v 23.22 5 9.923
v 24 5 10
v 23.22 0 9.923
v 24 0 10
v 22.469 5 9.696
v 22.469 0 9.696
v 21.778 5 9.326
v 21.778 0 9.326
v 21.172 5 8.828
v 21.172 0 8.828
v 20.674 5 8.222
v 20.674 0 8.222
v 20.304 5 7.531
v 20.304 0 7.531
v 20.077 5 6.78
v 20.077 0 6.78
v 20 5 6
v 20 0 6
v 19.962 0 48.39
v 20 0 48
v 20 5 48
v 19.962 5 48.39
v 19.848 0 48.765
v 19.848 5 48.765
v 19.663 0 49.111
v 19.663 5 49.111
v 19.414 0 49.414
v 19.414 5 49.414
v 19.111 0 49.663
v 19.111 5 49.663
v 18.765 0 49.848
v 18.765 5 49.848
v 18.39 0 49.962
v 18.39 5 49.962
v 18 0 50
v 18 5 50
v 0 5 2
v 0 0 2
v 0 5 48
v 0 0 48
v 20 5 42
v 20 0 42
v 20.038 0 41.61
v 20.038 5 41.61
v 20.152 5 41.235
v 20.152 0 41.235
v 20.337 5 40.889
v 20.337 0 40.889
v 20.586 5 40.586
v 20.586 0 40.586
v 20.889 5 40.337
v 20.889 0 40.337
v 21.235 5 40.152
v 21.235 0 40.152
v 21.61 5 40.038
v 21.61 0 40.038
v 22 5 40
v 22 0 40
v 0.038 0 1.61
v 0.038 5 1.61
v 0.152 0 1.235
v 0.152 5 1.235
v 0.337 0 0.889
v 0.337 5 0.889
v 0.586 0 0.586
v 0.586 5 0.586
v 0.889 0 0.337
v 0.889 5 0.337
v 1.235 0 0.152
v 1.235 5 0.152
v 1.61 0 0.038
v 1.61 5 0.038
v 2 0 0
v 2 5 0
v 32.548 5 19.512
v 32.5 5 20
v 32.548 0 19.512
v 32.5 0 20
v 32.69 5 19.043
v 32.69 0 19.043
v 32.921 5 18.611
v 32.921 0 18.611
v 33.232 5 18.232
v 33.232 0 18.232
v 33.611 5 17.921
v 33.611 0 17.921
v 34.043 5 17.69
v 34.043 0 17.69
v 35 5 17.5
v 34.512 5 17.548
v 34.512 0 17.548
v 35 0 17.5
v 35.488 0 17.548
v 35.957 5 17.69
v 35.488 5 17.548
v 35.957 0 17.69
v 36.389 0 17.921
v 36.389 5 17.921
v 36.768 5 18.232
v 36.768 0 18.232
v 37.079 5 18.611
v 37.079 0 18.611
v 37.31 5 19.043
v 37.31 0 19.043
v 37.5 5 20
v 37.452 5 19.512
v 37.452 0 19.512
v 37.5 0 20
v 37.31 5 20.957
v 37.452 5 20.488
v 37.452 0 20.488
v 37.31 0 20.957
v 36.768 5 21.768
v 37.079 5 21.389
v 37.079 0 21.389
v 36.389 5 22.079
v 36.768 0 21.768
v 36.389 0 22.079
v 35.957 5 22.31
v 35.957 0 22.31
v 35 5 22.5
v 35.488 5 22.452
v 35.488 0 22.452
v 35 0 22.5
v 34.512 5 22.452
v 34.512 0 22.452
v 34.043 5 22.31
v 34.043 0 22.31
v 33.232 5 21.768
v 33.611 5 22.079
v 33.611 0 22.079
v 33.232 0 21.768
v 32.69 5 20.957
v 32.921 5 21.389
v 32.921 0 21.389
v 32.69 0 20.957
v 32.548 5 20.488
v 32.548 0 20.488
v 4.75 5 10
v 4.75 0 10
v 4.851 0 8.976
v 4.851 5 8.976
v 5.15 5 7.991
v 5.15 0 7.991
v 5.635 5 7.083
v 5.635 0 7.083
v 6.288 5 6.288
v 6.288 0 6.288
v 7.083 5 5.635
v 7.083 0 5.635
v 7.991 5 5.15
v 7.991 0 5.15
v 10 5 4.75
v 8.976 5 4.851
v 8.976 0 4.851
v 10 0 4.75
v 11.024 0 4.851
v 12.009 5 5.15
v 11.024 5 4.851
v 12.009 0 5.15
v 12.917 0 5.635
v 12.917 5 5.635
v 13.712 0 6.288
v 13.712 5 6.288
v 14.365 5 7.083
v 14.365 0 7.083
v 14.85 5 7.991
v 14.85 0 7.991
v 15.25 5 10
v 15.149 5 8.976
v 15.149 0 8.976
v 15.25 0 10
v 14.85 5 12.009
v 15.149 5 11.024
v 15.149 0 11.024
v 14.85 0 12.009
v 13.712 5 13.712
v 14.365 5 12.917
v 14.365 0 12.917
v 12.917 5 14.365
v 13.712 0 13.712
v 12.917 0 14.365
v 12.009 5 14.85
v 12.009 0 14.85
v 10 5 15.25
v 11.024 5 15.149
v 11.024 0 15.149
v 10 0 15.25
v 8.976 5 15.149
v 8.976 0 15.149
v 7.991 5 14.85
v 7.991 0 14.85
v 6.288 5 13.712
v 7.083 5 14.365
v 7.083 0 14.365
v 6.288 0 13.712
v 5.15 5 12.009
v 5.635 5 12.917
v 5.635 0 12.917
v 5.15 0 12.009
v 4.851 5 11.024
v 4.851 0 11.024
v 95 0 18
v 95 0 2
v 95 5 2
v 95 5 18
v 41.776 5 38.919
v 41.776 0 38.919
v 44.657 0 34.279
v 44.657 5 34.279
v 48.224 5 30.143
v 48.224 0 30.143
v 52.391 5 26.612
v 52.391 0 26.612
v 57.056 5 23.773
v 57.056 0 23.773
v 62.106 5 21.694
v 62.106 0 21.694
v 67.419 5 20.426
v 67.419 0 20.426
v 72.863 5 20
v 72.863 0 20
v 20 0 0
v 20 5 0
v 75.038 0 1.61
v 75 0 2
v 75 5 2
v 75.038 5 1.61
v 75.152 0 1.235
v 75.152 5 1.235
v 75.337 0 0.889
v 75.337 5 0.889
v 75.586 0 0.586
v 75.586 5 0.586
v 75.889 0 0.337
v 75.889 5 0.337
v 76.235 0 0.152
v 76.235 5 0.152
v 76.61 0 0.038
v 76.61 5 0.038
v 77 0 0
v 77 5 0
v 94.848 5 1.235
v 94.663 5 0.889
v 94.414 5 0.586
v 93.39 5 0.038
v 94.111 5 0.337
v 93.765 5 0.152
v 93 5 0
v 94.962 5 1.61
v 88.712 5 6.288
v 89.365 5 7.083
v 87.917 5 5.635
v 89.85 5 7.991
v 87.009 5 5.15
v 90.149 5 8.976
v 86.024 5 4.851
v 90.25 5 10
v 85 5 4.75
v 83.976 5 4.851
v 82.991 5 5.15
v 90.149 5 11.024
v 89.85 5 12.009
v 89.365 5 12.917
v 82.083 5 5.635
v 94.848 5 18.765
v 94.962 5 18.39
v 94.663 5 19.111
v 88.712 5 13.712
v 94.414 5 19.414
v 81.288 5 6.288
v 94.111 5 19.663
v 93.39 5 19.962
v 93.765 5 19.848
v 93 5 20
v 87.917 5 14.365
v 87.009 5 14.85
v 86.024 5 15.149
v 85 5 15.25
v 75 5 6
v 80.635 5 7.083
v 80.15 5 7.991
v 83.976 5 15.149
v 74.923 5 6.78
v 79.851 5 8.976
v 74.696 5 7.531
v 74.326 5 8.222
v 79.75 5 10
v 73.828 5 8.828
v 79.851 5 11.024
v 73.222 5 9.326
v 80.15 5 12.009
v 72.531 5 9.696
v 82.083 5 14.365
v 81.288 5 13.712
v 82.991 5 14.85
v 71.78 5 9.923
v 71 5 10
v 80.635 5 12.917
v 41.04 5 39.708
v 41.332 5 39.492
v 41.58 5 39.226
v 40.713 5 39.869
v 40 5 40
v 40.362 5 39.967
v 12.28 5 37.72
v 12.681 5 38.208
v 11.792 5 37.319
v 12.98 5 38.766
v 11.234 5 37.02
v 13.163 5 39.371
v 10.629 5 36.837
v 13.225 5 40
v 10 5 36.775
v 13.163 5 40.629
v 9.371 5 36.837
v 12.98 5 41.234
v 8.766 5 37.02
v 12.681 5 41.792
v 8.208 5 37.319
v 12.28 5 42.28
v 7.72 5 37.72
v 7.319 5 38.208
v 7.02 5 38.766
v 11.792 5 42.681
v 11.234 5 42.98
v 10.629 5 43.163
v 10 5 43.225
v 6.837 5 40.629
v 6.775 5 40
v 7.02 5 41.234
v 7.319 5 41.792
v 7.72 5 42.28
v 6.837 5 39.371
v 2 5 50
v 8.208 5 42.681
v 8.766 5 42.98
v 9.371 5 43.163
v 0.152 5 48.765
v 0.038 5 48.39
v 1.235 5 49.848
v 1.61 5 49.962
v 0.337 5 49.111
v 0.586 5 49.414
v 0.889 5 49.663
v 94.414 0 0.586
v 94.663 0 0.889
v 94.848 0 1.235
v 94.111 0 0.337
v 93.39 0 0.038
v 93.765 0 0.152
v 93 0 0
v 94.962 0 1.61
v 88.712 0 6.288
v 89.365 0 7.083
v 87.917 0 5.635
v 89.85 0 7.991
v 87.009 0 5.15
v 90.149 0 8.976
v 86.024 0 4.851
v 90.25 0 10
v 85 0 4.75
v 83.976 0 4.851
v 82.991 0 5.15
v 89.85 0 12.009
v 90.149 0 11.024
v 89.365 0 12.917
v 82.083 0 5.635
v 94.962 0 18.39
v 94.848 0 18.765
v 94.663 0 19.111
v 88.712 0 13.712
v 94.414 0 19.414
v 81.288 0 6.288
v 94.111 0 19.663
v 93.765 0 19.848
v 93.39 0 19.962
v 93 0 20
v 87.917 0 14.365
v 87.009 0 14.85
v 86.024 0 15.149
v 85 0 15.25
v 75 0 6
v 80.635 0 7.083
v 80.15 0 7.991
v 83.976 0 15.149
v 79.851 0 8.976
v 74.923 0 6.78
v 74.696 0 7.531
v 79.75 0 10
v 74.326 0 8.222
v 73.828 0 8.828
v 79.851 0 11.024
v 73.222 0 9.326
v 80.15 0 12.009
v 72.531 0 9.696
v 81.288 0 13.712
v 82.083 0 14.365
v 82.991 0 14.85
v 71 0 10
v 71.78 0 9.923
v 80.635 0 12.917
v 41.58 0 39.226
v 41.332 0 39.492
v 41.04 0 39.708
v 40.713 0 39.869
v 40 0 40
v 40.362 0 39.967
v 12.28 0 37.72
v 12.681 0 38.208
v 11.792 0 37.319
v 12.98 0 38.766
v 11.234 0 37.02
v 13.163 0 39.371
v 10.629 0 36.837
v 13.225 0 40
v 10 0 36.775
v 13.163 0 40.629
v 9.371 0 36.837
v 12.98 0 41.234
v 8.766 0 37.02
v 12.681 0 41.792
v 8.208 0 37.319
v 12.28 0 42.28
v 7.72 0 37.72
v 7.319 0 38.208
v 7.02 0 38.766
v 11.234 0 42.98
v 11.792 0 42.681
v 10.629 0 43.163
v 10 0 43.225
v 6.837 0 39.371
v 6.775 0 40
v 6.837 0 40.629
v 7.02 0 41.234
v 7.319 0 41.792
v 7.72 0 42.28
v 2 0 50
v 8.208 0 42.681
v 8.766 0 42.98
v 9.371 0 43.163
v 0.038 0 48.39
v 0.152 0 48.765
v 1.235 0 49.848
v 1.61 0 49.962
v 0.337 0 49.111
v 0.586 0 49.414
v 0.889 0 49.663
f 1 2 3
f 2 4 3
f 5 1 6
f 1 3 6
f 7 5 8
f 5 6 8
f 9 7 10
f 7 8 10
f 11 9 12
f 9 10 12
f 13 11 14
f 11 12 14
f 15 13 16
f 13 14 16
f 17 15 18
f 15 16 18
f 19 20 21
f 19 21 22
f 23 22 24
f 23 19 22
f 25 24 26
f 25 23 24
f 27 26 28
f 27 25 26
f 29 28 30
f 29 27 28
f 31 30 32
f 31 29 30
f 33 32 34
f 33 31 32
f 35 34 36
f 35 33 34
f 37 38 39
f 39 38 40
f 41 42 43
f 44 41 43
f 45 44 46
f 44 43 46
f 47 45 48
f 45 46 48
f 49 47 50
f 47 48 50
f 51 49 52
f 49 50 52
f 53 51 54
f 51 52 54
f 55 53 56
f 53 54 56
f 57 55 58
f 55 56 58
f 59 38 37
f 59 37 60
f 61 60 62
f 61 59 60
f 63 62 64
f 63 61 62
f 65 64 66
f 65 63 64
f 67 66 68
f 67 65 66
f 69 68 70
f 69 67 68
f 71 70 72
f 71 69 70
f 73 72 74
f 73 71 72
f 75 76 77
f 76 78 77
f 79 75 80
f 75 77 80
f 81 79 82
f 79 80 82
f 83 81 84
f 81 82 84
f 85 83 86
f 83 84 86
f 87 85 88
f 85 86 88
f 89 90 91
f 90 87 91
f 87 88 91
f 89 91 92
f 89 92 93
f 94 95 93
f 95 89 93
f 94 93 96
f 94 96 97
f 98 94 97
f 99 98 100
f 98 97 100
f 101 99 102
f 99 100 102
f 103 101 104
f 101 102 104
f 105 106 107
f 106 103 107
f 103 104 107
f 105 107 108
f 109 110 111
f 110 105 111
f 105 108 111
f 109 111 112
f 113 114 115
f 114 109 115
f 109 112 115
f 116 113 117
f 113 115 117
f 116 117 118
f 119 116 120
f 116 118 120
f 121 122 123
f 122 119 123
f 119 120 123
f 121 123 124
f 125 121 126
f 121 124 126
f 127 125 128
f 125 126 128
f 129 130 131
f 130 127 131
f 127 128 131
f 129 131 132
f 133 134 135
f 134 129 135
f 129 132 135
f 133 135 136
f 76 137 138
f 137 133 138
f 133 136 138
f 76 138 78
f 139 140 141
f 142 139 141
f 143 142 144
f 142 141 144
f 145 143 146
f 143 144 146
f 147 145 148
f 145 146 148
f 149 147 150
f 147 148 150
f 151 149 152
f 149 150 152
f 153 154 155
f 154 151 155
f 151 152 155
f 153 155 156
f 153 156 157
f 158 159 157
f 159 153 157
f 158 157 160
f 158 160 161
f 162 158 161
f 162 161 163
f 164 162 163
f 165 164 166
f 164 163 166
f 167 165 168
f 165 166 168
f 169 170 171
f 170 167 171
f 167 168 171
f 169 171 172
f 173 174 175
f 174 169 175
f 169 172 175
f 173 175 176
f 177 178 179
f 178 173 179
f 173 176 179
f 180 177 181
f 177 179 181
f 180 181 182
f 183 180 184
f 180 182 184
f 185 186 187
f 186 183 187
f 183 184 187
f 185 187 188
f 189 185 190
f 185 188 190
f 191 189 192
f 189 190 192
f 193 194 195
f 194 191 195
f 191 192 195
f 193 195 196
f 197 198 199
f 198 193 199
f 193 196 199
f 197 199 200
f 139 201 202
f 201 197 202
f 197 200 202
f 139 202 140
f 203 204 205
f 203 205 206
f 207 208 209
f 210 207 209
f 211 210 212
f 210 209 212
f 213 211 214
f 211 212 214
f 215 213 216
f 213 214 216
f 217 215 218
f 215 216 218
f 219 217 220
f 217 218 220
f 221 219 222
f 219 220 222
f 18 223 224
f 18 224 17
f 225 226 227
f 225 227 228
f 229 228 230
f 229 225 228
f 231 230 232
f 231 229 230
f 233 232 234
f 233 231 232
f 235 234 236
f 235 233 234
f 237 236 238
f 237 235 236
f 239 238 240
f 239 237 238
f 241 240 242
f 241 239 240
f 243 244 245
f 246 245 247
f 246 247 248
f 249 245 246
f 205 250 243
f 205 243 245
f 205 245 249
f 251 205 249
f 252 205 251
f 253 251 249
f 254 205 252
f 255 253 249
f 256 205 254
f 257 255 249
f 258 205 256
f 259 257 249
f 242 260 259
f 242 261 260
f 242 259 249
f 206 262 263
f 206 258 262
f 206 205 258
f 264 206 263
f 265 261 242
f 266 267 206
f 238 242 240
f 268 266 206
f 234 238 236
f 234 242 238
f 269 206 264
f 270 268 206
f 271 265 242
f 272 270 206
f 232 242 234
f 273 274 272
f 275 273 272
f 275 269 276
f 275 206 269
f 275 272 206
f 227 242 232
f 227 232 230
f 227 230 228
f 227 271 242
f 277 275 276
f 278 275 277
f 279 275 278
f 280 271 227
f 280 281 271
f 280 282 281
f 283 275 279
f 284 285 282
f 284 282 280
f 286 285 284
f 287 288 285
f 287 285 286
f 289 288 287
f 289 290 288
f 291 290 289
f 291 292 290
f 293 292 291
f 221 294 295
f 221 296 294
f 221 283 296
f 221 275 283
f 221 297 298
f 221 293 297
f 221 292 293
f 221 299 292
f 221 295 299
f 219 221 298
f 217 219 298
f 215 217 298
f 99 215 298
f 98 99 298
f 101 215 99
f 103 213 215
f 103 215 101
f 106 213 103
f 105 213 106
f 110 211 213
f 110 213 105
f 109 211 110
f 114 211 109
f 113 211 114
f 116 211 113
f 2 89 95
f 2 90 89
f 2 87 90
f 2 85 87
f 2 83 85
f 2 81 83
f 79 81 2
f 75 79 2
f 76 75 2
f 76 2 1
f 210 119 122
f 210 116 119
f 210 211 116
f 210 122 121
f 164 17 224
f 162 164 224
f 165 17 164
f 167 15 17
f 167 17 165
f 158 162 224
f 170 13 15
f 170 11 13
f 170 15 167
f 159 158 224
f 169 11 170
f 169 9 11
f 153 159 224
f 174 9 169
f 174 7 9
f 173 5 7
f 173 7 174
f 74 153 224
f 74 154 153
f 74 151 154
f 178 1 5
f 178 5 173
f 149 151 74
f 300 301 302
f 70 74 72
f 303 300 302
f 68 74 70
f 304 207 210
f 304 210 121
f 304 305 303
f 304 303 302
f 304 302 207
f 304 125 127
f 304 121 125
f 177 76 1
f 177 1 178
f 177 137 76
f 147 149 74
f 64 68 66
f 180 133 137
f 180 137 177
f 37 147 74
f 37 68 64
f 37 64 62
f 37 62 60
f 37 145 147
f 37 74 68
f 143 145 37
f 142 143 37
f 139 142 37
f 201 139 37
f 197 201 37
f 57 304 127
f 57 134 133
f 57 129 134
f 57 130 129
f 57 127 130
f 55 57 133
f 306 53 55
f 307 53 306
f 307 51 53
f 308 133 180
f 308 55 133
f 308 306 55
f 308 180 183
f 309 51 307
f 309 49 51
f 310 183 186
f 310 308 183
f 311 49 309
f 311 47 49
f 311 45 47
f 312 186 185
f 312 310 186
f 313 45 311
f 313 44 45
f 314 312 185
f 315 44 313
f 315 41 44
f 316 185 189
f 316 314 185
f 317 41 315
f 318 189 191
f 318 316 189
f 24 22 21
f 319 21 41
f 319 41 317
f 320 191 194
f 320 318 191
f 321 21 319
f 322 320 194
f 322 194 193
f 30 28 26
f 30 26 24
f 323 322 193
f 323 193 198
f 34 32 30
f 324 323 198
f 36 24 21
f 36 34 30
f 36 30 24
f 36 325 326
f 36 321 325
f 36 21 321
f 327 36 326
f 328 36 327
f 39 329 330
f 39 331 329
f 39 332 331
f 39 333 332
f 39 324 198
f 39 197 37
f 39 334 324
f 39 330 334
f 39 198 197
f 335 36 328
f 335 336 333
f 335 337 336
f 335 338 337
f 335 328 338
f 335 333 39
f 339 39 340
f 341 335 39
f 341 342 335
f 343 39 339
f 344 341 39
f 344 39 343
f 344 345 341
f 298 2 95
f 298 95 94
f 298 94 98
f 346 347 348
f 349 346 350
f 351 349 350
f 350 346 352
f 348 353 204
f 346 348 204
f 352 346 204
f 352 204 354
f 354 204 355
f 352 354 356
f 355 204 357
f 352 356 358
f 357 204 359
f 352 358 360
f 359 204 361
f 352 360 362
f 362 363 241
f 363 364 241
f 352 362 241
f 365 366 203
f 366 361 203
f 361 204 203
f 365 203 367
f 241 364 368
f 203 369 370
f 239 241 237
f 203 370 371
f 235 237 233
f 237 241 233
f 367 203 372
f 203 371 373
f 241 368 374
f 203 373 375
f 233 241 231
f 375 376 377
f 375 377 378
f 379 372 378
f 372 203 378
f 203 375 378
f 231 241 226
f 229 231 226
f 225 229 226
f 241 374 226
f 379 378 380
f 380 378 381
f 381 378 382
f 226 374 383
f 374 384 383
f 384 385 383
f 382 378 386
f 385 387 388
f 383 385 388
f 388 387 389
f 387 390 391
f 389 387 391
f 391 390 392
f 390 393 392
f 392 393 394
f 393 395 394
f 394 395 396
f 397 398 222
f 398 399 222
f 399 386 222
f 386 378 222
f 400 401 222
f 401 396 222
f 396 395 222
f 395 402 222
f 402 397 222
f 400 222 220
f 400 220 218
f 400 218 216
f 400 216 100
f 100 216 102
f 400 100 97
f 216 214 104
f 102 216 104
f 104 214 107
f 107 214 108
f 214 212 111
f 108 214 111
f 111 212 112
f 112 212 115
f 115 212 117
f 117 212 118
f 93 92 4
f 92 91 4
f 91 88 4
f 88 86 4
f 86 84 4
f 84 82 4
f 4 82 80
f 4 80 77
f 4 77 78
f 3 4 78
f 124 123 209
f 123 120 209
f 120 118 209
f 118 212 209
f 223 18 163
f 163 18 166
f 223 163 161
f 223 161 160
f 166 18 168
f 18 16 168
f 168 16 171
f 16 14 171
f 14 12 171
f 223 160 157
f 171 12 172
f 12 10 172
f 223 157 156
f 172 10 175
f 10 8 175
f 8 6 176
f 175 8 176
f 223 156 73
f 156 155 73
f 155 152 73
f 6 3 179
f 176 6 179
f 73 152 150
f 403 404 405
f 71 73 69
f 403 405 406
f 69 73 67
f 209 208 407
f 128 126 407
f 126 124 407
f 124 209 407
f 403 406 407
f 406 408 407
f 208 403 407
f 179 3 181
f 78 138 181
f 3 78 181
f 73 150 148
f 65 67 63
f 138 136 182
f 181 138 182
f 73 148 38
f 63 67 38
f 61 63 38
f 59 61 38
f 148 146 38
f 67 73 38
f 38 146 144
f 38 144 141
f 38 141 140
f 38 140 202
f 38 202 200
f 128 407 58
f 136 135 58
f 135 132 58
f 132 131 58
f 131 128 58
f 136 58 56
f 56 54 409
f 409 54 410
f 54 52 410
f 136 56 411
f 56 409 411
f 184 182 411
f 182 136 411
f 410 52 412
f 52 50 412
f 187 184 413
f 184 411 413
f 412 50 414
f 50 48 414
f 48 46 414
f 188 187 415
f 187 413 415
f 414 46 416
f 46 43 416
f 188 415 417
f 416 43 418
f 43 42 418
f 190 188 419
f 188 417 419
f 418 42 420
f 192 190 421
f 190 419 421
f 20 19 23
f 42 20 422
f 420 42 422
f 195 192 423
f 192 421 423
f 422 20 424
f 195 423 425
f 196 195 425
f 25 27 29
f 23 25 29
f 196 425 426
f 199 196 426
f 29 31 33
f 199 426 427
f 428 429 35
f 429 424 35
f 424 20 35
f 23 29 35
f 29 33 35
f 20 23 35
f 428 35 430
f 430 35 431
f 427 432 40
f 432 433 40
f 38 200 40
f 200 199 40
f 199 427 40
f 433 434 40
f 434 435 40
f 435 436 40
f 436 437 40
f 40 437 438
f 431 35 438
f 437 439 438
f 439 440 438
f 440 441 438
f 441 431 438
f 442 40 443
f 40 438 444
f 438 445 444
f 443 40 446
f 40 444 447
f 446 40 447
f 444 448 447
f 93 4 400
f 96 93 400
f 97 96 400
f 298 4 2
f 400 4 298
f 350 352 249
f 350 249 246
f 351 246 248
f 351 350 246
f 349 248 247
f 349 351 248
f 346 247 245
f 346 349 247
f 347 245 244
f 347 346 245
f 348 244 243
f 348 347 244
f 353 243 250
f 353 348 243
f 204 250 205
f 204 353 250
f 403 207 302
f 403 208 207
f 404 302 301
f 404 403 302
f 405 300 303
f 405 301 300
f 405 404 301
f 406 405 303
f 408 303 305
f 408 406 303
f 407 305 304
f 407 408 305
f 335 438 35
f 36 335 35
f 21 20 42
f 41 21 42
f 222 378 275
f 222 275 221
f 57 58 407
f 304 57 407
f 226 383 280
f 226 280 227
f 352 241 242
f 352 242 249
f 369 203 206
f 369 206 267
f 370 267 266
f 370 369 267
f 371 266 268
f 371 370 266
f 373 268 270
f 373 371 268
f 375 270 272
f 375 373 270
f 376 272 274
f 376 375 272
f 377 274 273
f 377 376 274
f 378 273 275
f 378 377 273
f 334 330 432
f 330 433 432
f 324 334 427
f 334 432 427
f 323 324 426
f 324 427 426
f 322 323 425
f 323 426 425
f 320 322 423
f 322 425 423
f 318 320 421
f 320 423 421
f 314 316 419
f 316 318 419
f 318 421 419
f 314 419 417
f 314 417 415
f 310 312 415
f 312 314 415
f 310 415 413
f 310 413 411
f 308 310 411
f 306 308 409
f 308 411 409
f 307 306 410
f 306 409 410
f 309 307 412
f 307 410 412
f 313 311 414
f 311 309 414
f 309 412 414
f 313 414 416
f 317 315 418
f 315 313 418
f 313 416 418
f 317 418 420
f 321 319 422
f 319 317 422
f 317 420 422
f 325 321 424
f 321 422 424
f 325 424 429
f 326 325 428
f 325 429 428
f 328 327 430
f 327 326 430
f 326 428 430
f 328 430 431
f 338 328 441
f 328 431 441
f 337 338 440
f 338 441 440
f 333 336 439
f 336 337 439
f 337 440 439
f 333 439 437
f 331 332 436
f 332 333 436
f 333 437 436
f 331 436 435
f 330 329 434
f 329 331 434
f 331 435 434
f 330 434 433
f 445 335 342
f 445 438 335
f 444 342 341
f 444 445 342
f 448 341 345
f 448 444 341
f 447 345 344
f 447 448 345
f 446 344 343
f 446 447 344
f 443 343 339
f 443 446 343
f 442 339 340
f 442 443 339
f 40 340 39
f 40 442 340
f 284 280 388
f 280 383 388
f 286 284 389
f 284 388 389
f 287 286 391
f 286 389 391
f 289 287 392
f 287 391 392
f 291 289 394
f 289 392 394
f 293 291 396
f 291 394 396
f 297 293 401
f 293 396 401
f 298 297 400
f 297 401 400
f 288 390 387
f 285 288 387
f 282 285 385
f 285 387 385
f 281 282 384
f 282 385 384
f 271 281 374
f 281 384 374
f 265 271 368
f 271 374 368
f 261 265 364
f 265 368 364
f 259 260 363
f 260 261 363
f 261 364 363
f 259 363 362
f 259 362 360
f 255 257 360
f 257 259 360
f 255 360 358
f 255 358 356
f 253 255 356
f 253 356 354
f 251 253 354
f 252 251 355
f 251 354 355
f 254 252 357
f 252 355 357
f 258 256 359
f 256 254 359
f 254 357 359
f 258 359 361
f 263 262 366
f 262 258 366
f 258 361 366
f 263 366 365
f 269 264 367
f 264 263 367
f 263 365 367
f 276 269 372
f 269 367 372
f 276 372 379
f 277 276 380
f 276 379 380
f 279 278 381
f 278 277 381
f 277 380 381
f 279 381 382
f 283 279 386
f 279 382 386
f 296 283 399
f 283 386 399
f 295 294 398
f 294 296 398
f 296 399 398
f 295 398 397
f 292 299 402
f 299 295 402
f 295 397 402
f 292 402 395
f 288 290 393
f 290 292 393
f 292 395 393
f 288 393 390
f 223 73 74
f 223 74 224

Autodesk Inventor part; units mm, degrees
ref_plane "YZ Plane" through (0, 0, 0) normal (1, 0, 0) x (0, 1, 0)
ref_plane "XZ Plane" through (0, 0, 0) normal (0, 1, 0) x (-1, 0, 0)
ref_plane "XY Plane" through (0, 0, 0) normal (0, 0, 1) x (1, 0, 0)
sketch "Sketch1" plane through (0, 0, 0) normal (0, 1, 0) x (-1, 0, 0)
  line L0 (0, 2) -> (0, 48)
  line L1 (-2, 50) -> (-18, 50)
  line L2 (-20, 48) -> (-20, 42)
  line L3 (-22, 40) -> (-40, 40)
  line L4 (-2, 0) -> (-20, 0)
  line L5 (-20, 0) -> (-20, 6)
  line L6 (-24, 10) -> (-71, 10)
  line L7 (-75, 6) -> (-75, 2)
  line L8 (-77, 0) -> (-93, 0)
  line L9 (-95, 2) -> (-95, 18)
  arc A0 (-72.8634, 20) -> (-41.7764, 38.9189) centre (-72.8634, 55) ccw
  arc A1 (-40, 40) -> (-41.7764, 38.9189) centre (-40, 38) ccw
  line L10 (-93, 20) -> (-72.8634, 20)
  arc A2 (0, 48) -> (-2, 50) centre (-2, 48) ccw
  arc A3 (-2, 0) -> (0, 2) centre (-2, 2) ccw
  arc A4 (-18, 50) -> (-20, 48) centre (-18, 48) ccw
  arc A5 (-22, 40) -> (-20, 42) centre (-22, 42) ccw
  arc A6 (-77, 0) -> (-75, 2) centre (-77, 2) ccw
  arc A7 (-95, 2) -> (-93, 0) centre (-93, 2) ccw
  arc A8 (-93, 20) -> (-95, 18) centre (-93, 18) ccw
  arc A9 (-20, 6) -> (-24, 10) centre (-24, 6) ccw
  arc A10 (-71, 10) -> (-75, 6) centre (-71, 6) ccw
  circle A11 centre (-10, 40) radius 3.225
  circle A12 centre (-10, 10) radius 5.25
  circle A13 centre (-35, 20) radius 2.5
  circle A14 centre (-85, 10) radius 5.25
  point P0 (0, 0)
  point P1 (0, 50)
  point P2 (-20, 50)
  point P3 (-20, 40)
  point P4 (-20, 10)
  point P5 (-75, 10)
  point P6 (-75, 0)
  point P7 (-95, 0)
  point P8 (-95, 20)
  dimension "d0" = 50
  dimension "d1" = 20
  dimension "d2" = 10
  dimension "d3" = 20
  dimension "d4" = 20
  dimension "d5" = 10
  dimension "d6" = 55
  dimension "d7" = 20
  dimension "d8" = 20
  dimension "d9" = 70
  dimension "d11" = 4
  dimension "d12" = 2
  dimension "d13" = 2
  dimension "d14" = 4
  dimension "d15" = 6.45
  dimension "d16" = 10.5
  dimension "d17" = 30
  dimension "d18" = 10
  dimension "d19" = 10
  dimension "d20" = 10
  dimension "d21" = 5
  dimension "d22" = 25
  dimension "d25" = 10.5
  dimension "d26" = 10
extrude "Extrusion1" add sketch "Sketch1" along normal blind 5
properties part number "Barrel Support" material "Wood (Walnut)"
